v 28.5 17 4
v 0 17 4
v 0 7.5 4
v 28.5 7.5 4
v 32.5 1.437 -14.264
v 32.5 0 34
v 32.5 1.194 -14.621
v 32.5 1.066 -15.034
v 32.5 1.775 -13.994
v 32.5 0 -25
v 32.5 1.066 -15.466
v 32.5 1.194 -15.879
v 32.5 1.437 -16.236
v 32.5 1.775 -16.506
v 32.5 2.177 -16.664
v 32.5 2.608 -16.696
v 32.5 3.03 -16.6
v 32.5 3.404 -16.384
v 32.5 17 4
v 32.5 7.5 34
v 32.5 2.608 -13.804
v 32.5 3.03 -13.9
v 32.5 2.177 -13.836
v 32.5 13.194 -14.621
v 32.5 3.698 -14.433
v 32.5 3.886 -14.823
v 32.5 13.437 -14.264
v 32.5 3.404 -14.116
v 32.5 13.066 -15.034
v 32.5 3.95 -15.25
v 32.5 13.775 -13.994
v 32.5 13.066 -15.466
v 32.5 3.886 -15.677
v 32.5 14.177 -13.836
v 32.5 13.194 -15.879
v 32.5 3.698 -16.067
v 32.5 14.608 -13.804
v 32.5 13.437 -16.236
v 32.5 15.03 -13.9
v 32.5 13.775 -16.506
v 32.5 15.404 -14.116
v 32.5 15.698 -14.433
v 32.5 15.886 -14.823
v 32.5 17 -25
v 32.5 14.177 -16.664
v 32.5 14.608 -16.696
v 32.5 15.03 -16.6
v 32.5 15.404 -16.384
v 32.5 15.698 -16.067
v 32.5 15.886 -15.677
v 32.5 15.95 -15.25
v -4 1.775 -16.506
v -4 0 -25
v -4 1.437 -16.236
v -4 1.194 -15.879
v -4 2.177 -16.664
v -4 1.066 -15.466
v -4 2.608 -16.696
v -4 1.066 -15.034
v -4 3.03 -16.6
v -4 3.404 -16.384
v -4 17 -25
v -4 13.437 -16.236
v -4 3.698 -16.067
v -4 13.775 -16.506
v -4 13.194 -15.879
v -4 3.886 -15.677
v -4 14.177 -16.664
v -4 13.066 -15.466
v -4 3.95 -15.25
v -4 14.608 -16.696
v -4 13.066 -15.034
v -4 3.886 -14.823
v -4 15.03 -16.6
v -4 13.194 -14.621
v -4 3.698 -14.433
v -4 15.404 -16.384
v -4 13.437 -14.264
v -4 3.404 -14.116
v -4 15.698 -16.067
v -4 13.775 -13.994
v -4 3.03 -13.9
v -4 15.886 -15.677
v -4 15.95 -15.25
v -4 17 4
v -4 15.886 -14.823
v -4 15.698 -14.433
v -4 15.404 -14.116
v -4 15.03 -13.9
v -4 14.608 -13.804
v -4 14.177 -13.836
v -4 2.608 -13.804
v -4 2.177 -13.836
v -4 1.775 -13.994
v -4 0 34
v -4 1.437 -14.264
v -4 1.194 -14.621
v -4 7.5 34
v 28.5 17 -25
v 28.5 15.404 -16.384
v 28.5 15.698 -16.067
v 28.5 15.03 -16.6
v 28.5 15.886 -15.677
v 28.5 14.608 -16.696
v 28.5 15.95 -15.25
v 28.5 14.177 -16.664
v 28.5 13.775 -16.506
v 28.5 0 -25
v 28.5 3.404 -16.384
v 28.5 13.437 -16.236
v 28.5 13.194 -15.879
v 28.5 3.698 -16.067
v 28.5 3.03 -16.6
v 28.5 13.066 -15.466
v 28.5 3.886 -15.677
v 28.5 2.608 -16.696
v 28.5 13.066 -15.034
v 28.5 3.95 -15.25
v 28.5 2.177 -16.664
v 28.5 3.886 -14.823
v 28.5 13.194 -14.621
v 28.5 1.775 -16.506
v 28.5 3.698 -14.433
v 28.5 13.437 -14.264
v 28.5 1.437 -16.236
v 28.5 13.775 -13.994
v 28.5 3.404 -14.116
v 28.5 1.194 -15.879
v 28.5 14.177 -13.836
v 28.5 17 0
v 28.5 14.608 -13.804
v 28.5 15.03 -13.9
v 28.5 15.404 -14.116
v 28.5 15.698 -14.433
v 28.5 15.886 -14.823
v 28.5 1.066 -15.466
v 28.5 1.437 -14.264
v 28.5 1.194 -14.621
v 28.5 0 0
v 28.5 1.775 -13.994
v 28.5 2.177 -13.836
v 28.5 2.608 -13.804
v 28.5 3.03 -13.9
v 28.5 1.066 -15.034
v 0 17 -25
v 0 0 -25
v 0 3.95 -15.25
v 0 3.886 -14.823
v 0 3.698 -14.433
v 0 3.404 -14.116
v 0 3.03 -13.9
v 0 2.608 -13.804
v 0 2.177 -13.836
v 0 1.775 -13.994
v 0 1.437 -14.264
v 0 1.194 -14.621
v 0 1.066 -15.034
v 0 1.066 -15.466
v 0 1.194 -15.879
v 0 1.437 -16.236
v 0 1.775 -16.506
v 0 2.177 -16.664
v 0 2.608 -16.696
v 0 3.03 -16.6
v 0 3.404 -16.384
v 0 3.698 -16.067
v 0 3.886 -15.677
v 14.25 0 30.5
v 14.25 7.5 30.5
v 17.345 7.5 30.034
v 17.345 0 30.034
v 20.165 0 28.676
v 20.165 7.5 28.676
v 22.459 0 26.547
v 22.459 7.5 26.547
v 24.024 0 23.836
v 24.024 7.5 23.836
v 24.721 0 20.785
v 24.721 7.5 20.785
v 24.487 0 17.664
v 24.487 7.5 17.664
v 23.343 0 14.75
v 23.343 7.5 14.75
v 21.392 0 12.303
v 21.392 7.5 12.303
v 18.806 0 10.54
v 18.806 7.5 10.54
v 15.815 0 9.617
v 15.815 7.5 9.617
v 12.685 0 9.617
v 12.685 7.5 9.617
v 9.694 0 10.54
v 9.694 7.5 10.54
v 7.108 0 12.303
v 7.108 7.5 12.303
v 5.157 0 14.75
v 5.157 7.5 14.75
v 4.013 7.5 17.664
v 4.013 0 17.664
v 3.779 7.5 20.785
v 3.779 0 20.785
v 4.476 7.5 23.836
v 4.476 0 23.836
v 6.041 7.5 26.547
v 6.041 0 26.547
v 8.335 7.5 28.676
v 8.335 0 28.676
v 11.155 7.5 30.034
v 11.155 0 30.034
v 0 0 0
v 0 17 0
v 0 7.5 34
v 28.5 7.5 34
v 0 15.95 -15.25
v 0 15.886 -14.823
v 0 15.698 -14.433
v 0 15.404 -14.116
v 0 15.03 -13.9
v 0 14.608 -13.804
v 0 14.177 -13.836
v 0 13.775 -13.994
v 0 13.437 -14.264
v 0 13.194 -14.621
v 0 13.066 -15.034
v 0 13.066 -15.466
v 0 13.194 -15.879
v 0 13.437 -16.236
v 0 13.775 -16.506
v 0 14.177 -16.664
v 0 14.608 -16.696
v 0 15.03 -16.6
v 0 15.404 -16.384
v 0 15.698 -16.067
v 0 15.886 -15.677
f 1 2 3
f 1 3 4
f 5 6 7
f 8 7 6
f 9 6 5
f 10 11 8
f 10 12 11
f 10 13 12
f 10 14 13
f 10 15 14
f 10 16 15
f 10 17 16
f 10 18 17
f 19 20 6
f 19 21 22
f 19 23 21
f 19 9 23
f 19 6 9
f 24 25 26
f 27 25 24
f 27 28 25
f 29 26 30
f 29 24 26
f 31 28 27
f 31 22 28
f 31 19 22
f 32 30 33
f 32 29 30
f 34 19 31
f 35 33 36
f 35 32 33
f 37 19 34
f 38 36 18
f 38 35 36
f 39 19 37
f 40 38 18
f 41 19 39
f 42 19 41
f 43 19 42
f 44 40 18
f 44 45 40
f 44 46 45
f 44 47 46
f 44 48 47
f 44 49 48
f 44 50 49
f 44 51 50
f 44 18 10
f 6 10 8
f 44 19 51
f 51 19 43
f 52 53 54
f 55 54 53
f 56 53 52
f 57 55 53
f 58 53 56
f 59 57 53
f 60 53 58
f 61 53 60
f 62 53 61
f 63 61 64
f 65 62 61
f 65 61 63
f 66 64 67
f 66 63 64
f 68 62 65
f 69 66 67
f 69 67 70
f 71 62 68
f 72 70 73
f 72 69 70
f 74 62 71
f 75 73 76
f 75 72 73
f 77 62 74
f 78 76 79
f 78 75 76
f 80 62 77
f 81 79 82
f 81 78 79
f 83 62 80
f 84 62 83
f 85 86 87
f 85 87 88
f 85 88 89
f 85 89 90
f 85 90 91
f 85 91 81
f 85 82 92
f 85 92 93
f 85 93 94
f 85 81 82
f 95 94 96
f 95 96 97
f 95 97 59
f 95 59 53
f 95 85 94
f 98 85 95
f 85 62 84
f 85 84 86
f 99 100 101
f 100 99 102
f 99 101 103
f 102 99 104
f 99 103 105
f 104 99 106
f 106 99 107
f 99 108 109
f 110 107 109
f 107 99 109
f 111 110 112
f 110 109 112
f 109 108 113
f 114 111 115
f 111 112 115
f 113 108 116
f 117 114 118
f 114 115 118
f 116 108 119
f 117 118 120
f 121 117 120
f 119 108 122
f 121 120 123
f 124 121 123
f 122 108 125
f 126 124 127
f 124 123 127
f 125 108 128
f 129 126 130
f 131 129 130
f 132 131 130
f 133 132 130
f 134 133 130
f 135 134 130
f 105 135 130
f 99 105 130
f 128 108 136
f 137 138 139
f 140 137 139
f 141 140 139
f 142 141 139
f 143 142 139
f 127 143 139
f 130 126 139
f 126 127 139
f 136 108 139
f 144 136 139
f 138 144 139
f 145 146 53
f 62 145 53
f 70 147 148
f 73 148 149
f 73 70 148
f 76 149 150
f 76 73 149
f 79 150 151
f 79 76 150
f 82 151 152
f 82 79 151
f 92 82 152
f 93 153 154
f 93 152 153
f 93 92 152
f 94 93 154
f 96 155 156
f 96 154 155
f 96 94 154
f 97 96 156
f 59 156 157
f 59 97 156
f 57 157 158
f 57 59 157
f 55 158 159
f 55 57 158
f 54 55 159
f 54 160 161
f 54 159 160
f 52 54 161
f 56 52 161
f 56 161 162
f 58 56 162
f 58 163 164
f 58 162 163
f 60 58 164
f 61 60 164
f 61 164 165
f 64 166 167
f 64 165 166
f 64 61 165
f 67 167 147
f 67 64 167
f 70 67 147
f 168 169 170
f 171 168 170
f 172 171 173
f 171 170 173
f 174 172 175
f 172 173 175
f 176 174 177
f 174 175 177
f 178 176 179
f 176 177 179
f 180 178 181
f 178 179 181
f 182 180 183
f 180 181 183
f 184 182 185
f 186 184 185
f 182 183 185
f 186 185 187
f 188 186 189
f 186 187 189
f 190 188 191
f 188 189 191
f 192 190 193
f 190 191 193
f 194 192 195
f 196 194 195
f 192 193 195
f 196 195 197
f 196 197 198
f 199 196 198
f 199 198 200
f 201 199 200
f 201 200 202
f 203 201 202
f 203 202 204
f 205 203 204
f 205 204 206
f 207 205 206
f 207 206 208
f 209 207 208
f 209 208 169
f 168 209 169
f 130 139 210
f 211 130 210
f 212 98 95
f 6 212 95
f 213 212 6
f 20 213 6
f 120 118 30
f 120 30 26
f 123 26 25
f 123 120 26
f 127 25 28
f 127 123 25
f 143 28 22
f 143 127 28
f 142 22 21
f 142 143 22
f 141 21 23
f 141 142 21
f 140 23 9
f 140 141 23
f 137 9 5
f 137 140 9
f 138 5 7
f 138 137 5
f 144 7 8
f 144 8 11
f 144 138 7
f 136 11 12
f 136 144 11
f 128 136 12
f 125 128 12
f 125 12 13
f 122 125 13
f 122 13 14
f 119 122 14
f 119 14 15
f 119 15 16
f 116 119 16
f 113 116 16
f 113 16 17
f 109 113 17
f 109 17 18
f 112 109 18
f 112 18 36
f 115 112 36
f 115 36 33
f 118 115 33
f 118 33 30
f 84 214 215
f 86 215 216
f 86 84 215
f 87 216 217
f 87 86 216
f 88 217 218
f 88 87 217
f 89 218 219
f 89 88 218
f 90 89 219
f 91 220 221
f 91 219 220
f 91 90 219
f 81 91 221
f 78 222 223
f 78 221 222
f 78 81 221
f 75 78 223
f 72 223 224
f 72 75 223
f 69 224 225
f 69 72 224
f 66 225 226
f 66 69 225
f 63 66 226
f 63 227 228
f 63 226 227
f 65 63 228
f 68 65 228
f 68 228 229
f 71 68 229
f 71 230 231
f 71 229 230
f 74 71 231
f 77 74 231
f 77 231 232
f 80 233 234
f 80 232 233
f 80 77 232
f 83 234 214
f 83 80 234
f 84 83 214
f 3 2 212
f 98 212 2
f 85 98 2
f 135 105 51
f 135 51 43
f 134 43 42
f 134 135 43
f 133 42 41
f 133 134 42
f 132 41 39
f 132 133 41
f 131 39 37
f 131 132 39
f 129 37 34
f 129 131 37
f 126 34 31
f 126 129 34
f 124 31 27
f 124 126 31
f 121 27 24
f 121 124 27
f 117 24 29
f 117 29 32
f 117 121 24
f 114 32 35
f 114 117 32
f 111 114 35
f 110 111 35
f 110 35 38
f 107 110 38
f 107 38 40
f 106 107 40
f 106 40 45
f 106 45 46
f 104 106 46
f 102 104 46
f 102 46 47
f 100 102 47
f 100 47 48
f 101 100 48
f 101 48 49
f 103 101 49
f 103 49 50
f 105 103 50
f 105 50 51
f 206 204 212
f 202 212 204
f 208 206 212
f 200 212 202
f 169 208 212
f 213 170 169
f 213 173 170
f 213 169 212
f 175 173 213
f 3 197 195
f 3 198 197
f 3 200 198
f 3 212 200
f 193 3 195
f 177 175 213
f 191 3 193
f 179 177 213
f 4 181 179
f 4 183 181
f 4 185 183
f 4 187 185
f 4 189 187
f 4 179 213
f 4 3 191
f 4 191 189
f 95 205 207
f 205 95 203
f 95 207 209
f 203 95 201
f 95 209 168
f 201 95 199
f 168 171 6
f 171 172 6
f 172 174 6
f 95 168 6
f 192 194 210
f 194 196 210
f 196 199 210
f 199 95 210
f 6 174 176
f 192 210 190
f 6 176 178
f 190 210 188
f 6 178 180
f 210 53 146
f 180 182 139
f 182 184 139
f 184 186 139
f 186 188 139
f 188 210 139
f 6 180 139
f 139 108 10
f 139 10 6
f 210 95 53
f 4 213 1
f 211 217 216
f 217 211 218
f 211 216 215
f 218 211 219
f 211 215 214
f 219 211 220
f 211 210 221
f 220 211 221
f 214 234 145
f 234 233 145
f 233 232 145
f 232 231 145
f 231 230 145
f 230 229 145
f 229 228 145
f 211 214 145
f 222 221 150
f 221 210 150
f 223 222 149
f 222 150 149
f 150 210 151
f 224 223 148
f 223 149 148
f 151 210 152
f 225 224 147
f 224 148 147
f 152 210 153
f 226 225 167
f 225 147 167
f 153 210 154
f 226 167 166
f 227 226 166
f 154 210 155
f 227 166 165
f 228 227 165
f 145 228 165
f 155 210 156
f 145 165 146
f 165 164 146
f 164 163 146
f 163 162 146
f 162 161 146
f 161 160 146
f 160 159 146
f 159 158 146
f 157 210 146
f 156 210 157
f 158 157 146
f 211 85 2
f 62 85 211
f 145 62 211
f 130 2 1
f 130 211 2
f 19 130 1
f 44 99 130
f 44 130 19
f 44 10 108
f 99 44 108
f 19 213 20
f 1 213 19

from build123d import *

# Parameters (mm, degrees)
BOSS_EXTRUDE1_DEPTH            = 17
M2_5_START                     = -4
M2_5_CLEARANCE_HOLE1_OUTLINE_R = 1.45
M2_5_CLEARANCE_HOLE1_DEPTH     = 36.5
SKETCH6_W                      = 36.5
SKETCH6_H                      = 17
BOSS_EXTRUDE2_DEPTH            = 30
SKETCH7_R                      = 10.5
CUT_EXTRUDE1_DEPTH             = 51.012498438
SKETCH8_W                      = 36.5
SKETCH8_H                      = 30
CUT_EXTRUDE2_DEPTH             = 9.5
RIB1_REACH                     = 54.7
SKETCH9_WALL_W                 = 138.86747894
SKETCH9_WALL_H                 = 4
RIB2_START                     = -4
RIB2_DEPTH                     = 4


# Read off the part's stored shape, not the designer's step: M2.5 Clearance Hole1, Rib2
with BuildPart() as part:
    # Sketch1 → Boss-Extrude1 (new body)
    with BuildSketch(Plane(origin=(0, 0, 0), x_dir=(1, 0, 0), z_dir=(0, 1, 0))):
        Polygon((32.5, -4), (32.5, 25), (28.5, 25), (28.5, 0), (0, 0), (0, 25), (-4, 25), (-4, -4), align=None)
    extrude(amount=BOSS_EXTRUDE1_DEPTH)

    # M2.5 Clearance Hole1 outline → M2.5 Clearance Hole1 (cut)
    with BuildSketch(Plane.YZ.offset(M2_5_START)):
        with Locations((2.5, -15.25)):
            Circle(M2_5_CLEARANCE_HOLE1_OUTLINE_R)
        with Locations((14.5, -15.25)):
            Circle(M2_5_CLEARANCE_HOLE1_OUTLINE_R)
    extrude(amount=M2_5_CLEARANCE_HOLE1_DEPTH, mode=Mode.SUBTRACT)

    # Sketch6 → Boss-Extrude2 (add)
    with BuildSketch(Plane.XY.offset(4)):
        with Locations((14.25, 8.5)):
            Rectangle(SKETCH6_W, SKETCH6_H)
    extrude(amount=BOSS_EXTRUDE2_DEPTH)

    # Sketch7 → Cut-Extrude1 (cut, through all)
    with BuildSketch(Plane(origin=(0, 17, 0), x_dir=(1, 0, 0), z_dir=(0, 1, 0))):
        with Locations(Location((14.25, -20, 0), (0, 0, 270))):
            Circle(SKETCH7_R)
    extrude(amount=-CUT_EXTRUDE1_DEPTH, mode=Mode.SUBTRACT)

    # Sketch8 → Cut-Extrude2 (cut)
    with BuildSketch(Plane(origin=(0, 17, 0), x_dir=(1, 0, 0), z_dir=(0, 1, 0))):
        with Locations((14.25, -19)):
            Rectangle(SKETCH8_W, SKETCH8_H)
    extrude(amount=-CUT_EXTRUDE2_DEPTH, mode=Mode.SUBTRACT)

    # Sketch9 wall → Rib1 (add, up to next)
    with BuildSketch(Plane(origin=(32.5, 12.25, 19), x_dir=(0, 0.301891704694, -0.953342225351), z_dir=(0, 0.953342225351, 0.301891704694)), mode=Mode.PRIVATE) as rib1_sk1:
        with Locations((0, 2)):
            Rectangle(SKETCH9_WALL_W, SKETCH9_WALL_H)
    rib1_tool1 = extrude(rib1_sk1.sketch, amount=-RIB1_REACH, mode=Mode.PRIVATE) - part.part
    add(rib1_tool1.solids().sort_by_distance((32.5, 12.25, 19))[0])

    # Rib2 outline → Rib2 (add)
    with BuildSketch(Plane.ZY.offset(4).offset(RIB2_START)):
        Polygon((34, 7.5), (4, 17), (4, 7.5), align=None)
    extrude(amount=RIB2_DEPTH)


solid = part.part
